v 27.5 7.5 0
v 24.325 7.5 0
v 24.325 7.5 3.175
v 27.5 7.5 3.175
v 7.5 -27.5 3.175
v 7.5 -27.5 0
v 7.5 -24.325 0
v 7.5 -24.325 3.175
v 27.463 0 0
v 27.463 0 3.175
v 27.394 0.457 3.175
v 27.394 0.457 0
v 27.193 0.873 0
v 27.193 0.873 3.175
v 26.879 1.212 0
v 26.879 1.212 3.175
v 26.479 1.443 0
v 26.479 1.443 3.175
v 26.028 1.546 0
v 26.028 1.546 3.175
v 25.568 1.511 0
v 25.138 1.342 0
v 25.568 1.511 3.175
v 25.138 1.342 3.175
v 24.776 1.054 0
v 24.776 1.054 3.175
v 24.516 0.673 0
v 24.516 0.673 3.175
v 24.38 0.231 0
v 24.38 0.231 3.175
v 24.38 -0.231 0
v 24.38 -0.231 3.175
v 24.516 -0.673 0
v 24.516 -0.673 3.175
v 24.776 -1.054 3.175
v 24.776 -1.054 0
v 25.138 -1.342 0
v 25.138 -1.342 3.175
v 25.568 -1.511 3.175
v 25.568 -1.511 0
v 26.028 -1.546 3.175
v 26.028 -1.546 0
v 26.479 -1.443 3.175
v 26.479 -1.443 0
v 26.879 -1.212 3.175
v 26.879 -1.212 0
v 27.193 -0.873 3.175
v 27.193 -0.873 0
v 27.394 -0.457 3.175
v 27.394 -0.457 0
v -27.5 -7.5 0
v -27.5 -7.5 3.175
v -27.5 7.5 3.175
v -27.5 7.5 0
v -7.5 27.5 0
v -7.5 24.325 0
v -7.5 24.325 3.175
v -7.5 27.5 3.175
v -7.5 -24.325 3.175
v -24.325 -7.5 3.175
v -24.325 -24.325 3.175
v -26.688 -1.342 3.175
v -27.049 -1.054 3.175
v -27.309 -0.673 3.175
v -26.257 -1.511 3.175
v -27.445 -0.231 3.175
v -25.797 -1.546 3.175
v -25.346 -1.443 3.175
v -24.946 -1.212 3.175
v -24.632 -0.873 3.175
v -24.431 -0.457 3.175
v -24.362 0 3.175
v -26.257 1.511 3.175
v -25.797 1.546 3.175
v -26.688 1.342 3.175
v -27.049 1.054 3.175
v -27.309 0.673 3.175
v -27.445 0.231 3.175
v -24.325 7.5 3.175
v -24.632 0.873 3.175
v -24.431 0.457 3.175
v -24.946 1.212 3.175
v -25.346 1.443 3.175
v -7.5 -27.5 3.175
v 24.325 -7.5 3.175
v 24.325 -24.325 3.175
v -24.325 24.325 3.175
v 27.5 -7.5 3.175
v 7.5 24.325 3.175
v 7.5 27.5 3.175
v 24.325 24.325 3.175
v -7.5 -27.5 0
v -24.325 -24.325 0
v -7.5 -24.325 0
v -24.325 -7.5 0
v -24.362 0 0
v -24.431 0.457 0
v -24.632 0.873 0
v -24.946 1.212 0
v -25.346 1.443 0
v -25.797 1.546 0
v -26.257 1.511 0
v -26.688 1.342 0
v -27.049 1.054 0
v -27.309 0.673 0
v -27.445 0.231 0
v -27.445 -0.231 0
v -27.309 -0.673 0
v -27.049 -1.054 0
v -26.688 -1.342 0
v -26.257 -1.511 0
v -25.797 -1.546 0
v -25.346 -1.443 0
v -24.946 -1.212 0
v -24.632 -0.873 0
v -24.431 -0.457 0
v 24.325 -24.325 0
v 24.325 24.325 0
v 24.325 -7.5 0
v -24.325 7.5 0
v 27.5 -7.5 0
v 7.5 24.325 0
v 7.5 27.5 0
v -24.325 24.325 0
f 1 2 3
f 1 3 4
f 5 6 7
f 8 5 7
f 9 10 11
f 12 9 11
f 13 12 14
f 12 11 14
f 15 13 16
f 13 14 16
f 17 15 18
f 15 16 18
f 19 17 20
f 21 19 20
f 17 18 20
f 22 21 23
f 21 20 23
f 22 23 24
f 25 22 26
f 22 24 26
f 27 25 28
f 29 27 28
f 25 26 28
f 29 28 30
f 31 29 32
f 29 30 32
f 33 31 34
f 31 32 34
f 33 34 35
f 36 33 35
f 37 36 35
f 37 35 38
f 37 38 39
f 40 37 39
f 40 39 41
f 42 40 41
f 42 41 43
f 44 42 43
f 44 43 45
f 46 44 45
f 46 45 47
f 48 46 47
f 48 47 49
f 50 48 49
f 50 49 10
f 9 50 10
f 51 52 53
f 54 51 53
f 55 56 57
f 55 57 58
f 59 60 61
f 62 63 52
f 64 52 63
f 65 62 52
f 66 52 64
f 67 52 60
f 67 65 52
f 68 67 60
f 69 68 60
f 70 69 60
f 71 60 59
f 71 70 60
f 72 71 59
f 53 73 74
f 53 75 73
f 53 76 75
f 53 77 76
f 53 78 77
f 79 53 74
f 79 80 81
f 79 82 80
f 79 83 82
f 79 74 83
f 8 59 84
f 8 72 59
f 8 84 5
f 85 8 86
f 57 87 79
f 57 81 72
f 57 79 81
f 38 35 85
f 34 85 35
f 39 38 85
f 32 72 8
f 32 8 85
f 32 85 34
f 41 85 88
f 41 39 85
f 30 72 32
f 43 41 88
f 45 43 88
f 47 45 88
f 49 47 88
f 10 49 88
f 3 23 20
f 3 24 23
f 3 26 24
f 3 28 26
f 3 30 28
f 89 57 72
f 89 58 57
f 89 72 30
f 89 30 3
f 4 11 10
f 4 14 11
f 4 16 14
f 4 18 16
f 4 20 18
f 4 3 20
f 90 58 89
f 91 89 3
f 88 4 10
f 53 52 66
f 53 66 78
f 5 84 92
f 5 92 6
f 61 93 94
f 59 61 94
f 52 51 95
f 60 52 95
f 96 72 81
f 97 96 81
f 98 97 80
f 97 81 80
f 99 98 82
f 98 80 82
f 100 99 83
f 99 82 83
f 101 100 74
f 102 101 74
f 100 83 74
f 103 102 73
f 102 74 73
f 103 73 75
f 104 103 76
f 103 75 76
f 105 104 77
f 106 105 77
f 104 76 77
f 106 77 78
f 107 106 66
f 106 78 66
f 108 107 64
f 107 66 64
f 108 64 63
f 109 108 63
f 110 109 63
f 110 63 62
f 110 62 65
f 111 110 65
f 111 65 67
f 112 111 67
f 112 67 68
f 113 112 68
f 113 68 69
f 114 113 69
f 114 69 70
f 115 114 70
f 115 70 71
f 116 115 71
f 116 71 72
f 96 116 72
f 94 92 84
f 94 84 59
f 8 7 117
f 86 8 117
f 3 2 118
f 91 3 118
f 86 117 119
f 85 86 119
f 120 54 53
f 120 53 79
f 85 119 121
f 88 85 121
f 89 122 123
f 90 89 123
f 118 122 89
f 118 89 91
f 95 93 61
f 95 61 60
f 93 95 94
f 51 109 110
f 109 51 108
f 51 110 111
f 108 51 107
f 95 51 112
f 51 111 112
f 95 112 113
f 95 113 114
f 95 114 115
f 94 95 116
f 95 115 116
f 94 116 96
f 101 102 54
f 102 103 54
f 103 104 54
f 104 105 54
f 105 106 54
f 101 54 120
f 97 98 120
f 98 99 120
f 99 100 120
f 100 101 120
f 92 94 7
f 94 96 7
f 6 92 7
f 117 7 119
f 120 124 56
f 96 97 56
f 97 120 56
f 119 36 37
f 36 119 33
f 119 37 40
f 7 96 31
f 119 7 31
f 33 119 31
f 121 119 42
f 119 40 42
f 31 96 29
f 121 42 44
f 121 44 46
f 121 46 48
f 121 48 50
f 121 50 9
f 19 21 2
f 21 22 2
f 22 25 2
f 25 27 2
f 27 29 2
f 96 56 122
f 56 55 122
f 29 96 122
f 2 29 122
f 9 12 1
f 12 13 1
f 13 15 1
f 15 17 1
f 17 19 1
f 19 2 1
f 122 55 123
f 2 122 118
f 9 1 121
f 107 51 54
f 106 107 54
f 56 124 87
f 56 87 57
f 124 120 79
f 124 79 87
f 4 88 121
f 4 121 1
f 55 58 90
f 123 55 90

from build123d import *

# Parameters (mm, degrees)
F1_W     = 48.65
F1_H     = 48.65
F2_DEPTH = 3.175
F3_W     = 3.175
F3_H     = 15
F3_W_2   = 15
F3_H_2   = 3.175
F4_DEPTH = 3.175
F5_R     = 1.55
F6_DEPTH = 3.176


with BuildPart() as f2:
    # F1 (on Top) → F2 (new body)
    with BuildSketch(Plane.XY):
        Rectangle(F1_W, F1_H)
    extrude(amount=F2_DEPTH)

    # F3 (on face) → F4 (join, through all)
    with BuildSketch(Plane.XY.offset(3.175)):
        with Locations((-25.9125, 0)):
            Rectangle(F3_W, F3_H)
        with Locations((0, 25.9125)):
            Rectangle(F3_W_2, F3_H_2)
        with Locations((0, -25.9125)):
            Rectangle(F3_W_2, F3_H_2)
        with Locations((25.9125, 0)):
            Rectangle(F3_W, F3_H)
    extrude(amount=-F4_DEPTH)

    # F5 (on face) → F6 (cut, through all)
    with BuildSketch(Plane.XY.offset(3.175)):
        with Locations((-25.9125, 0)):
            Circle(F5_R)
        with Locations((25.9125, 0)):
            Circle(F5_R)
    extrude(amount=-F6_DEPTH, mode=Mode.SUBTRACT)


solid = f2.part
